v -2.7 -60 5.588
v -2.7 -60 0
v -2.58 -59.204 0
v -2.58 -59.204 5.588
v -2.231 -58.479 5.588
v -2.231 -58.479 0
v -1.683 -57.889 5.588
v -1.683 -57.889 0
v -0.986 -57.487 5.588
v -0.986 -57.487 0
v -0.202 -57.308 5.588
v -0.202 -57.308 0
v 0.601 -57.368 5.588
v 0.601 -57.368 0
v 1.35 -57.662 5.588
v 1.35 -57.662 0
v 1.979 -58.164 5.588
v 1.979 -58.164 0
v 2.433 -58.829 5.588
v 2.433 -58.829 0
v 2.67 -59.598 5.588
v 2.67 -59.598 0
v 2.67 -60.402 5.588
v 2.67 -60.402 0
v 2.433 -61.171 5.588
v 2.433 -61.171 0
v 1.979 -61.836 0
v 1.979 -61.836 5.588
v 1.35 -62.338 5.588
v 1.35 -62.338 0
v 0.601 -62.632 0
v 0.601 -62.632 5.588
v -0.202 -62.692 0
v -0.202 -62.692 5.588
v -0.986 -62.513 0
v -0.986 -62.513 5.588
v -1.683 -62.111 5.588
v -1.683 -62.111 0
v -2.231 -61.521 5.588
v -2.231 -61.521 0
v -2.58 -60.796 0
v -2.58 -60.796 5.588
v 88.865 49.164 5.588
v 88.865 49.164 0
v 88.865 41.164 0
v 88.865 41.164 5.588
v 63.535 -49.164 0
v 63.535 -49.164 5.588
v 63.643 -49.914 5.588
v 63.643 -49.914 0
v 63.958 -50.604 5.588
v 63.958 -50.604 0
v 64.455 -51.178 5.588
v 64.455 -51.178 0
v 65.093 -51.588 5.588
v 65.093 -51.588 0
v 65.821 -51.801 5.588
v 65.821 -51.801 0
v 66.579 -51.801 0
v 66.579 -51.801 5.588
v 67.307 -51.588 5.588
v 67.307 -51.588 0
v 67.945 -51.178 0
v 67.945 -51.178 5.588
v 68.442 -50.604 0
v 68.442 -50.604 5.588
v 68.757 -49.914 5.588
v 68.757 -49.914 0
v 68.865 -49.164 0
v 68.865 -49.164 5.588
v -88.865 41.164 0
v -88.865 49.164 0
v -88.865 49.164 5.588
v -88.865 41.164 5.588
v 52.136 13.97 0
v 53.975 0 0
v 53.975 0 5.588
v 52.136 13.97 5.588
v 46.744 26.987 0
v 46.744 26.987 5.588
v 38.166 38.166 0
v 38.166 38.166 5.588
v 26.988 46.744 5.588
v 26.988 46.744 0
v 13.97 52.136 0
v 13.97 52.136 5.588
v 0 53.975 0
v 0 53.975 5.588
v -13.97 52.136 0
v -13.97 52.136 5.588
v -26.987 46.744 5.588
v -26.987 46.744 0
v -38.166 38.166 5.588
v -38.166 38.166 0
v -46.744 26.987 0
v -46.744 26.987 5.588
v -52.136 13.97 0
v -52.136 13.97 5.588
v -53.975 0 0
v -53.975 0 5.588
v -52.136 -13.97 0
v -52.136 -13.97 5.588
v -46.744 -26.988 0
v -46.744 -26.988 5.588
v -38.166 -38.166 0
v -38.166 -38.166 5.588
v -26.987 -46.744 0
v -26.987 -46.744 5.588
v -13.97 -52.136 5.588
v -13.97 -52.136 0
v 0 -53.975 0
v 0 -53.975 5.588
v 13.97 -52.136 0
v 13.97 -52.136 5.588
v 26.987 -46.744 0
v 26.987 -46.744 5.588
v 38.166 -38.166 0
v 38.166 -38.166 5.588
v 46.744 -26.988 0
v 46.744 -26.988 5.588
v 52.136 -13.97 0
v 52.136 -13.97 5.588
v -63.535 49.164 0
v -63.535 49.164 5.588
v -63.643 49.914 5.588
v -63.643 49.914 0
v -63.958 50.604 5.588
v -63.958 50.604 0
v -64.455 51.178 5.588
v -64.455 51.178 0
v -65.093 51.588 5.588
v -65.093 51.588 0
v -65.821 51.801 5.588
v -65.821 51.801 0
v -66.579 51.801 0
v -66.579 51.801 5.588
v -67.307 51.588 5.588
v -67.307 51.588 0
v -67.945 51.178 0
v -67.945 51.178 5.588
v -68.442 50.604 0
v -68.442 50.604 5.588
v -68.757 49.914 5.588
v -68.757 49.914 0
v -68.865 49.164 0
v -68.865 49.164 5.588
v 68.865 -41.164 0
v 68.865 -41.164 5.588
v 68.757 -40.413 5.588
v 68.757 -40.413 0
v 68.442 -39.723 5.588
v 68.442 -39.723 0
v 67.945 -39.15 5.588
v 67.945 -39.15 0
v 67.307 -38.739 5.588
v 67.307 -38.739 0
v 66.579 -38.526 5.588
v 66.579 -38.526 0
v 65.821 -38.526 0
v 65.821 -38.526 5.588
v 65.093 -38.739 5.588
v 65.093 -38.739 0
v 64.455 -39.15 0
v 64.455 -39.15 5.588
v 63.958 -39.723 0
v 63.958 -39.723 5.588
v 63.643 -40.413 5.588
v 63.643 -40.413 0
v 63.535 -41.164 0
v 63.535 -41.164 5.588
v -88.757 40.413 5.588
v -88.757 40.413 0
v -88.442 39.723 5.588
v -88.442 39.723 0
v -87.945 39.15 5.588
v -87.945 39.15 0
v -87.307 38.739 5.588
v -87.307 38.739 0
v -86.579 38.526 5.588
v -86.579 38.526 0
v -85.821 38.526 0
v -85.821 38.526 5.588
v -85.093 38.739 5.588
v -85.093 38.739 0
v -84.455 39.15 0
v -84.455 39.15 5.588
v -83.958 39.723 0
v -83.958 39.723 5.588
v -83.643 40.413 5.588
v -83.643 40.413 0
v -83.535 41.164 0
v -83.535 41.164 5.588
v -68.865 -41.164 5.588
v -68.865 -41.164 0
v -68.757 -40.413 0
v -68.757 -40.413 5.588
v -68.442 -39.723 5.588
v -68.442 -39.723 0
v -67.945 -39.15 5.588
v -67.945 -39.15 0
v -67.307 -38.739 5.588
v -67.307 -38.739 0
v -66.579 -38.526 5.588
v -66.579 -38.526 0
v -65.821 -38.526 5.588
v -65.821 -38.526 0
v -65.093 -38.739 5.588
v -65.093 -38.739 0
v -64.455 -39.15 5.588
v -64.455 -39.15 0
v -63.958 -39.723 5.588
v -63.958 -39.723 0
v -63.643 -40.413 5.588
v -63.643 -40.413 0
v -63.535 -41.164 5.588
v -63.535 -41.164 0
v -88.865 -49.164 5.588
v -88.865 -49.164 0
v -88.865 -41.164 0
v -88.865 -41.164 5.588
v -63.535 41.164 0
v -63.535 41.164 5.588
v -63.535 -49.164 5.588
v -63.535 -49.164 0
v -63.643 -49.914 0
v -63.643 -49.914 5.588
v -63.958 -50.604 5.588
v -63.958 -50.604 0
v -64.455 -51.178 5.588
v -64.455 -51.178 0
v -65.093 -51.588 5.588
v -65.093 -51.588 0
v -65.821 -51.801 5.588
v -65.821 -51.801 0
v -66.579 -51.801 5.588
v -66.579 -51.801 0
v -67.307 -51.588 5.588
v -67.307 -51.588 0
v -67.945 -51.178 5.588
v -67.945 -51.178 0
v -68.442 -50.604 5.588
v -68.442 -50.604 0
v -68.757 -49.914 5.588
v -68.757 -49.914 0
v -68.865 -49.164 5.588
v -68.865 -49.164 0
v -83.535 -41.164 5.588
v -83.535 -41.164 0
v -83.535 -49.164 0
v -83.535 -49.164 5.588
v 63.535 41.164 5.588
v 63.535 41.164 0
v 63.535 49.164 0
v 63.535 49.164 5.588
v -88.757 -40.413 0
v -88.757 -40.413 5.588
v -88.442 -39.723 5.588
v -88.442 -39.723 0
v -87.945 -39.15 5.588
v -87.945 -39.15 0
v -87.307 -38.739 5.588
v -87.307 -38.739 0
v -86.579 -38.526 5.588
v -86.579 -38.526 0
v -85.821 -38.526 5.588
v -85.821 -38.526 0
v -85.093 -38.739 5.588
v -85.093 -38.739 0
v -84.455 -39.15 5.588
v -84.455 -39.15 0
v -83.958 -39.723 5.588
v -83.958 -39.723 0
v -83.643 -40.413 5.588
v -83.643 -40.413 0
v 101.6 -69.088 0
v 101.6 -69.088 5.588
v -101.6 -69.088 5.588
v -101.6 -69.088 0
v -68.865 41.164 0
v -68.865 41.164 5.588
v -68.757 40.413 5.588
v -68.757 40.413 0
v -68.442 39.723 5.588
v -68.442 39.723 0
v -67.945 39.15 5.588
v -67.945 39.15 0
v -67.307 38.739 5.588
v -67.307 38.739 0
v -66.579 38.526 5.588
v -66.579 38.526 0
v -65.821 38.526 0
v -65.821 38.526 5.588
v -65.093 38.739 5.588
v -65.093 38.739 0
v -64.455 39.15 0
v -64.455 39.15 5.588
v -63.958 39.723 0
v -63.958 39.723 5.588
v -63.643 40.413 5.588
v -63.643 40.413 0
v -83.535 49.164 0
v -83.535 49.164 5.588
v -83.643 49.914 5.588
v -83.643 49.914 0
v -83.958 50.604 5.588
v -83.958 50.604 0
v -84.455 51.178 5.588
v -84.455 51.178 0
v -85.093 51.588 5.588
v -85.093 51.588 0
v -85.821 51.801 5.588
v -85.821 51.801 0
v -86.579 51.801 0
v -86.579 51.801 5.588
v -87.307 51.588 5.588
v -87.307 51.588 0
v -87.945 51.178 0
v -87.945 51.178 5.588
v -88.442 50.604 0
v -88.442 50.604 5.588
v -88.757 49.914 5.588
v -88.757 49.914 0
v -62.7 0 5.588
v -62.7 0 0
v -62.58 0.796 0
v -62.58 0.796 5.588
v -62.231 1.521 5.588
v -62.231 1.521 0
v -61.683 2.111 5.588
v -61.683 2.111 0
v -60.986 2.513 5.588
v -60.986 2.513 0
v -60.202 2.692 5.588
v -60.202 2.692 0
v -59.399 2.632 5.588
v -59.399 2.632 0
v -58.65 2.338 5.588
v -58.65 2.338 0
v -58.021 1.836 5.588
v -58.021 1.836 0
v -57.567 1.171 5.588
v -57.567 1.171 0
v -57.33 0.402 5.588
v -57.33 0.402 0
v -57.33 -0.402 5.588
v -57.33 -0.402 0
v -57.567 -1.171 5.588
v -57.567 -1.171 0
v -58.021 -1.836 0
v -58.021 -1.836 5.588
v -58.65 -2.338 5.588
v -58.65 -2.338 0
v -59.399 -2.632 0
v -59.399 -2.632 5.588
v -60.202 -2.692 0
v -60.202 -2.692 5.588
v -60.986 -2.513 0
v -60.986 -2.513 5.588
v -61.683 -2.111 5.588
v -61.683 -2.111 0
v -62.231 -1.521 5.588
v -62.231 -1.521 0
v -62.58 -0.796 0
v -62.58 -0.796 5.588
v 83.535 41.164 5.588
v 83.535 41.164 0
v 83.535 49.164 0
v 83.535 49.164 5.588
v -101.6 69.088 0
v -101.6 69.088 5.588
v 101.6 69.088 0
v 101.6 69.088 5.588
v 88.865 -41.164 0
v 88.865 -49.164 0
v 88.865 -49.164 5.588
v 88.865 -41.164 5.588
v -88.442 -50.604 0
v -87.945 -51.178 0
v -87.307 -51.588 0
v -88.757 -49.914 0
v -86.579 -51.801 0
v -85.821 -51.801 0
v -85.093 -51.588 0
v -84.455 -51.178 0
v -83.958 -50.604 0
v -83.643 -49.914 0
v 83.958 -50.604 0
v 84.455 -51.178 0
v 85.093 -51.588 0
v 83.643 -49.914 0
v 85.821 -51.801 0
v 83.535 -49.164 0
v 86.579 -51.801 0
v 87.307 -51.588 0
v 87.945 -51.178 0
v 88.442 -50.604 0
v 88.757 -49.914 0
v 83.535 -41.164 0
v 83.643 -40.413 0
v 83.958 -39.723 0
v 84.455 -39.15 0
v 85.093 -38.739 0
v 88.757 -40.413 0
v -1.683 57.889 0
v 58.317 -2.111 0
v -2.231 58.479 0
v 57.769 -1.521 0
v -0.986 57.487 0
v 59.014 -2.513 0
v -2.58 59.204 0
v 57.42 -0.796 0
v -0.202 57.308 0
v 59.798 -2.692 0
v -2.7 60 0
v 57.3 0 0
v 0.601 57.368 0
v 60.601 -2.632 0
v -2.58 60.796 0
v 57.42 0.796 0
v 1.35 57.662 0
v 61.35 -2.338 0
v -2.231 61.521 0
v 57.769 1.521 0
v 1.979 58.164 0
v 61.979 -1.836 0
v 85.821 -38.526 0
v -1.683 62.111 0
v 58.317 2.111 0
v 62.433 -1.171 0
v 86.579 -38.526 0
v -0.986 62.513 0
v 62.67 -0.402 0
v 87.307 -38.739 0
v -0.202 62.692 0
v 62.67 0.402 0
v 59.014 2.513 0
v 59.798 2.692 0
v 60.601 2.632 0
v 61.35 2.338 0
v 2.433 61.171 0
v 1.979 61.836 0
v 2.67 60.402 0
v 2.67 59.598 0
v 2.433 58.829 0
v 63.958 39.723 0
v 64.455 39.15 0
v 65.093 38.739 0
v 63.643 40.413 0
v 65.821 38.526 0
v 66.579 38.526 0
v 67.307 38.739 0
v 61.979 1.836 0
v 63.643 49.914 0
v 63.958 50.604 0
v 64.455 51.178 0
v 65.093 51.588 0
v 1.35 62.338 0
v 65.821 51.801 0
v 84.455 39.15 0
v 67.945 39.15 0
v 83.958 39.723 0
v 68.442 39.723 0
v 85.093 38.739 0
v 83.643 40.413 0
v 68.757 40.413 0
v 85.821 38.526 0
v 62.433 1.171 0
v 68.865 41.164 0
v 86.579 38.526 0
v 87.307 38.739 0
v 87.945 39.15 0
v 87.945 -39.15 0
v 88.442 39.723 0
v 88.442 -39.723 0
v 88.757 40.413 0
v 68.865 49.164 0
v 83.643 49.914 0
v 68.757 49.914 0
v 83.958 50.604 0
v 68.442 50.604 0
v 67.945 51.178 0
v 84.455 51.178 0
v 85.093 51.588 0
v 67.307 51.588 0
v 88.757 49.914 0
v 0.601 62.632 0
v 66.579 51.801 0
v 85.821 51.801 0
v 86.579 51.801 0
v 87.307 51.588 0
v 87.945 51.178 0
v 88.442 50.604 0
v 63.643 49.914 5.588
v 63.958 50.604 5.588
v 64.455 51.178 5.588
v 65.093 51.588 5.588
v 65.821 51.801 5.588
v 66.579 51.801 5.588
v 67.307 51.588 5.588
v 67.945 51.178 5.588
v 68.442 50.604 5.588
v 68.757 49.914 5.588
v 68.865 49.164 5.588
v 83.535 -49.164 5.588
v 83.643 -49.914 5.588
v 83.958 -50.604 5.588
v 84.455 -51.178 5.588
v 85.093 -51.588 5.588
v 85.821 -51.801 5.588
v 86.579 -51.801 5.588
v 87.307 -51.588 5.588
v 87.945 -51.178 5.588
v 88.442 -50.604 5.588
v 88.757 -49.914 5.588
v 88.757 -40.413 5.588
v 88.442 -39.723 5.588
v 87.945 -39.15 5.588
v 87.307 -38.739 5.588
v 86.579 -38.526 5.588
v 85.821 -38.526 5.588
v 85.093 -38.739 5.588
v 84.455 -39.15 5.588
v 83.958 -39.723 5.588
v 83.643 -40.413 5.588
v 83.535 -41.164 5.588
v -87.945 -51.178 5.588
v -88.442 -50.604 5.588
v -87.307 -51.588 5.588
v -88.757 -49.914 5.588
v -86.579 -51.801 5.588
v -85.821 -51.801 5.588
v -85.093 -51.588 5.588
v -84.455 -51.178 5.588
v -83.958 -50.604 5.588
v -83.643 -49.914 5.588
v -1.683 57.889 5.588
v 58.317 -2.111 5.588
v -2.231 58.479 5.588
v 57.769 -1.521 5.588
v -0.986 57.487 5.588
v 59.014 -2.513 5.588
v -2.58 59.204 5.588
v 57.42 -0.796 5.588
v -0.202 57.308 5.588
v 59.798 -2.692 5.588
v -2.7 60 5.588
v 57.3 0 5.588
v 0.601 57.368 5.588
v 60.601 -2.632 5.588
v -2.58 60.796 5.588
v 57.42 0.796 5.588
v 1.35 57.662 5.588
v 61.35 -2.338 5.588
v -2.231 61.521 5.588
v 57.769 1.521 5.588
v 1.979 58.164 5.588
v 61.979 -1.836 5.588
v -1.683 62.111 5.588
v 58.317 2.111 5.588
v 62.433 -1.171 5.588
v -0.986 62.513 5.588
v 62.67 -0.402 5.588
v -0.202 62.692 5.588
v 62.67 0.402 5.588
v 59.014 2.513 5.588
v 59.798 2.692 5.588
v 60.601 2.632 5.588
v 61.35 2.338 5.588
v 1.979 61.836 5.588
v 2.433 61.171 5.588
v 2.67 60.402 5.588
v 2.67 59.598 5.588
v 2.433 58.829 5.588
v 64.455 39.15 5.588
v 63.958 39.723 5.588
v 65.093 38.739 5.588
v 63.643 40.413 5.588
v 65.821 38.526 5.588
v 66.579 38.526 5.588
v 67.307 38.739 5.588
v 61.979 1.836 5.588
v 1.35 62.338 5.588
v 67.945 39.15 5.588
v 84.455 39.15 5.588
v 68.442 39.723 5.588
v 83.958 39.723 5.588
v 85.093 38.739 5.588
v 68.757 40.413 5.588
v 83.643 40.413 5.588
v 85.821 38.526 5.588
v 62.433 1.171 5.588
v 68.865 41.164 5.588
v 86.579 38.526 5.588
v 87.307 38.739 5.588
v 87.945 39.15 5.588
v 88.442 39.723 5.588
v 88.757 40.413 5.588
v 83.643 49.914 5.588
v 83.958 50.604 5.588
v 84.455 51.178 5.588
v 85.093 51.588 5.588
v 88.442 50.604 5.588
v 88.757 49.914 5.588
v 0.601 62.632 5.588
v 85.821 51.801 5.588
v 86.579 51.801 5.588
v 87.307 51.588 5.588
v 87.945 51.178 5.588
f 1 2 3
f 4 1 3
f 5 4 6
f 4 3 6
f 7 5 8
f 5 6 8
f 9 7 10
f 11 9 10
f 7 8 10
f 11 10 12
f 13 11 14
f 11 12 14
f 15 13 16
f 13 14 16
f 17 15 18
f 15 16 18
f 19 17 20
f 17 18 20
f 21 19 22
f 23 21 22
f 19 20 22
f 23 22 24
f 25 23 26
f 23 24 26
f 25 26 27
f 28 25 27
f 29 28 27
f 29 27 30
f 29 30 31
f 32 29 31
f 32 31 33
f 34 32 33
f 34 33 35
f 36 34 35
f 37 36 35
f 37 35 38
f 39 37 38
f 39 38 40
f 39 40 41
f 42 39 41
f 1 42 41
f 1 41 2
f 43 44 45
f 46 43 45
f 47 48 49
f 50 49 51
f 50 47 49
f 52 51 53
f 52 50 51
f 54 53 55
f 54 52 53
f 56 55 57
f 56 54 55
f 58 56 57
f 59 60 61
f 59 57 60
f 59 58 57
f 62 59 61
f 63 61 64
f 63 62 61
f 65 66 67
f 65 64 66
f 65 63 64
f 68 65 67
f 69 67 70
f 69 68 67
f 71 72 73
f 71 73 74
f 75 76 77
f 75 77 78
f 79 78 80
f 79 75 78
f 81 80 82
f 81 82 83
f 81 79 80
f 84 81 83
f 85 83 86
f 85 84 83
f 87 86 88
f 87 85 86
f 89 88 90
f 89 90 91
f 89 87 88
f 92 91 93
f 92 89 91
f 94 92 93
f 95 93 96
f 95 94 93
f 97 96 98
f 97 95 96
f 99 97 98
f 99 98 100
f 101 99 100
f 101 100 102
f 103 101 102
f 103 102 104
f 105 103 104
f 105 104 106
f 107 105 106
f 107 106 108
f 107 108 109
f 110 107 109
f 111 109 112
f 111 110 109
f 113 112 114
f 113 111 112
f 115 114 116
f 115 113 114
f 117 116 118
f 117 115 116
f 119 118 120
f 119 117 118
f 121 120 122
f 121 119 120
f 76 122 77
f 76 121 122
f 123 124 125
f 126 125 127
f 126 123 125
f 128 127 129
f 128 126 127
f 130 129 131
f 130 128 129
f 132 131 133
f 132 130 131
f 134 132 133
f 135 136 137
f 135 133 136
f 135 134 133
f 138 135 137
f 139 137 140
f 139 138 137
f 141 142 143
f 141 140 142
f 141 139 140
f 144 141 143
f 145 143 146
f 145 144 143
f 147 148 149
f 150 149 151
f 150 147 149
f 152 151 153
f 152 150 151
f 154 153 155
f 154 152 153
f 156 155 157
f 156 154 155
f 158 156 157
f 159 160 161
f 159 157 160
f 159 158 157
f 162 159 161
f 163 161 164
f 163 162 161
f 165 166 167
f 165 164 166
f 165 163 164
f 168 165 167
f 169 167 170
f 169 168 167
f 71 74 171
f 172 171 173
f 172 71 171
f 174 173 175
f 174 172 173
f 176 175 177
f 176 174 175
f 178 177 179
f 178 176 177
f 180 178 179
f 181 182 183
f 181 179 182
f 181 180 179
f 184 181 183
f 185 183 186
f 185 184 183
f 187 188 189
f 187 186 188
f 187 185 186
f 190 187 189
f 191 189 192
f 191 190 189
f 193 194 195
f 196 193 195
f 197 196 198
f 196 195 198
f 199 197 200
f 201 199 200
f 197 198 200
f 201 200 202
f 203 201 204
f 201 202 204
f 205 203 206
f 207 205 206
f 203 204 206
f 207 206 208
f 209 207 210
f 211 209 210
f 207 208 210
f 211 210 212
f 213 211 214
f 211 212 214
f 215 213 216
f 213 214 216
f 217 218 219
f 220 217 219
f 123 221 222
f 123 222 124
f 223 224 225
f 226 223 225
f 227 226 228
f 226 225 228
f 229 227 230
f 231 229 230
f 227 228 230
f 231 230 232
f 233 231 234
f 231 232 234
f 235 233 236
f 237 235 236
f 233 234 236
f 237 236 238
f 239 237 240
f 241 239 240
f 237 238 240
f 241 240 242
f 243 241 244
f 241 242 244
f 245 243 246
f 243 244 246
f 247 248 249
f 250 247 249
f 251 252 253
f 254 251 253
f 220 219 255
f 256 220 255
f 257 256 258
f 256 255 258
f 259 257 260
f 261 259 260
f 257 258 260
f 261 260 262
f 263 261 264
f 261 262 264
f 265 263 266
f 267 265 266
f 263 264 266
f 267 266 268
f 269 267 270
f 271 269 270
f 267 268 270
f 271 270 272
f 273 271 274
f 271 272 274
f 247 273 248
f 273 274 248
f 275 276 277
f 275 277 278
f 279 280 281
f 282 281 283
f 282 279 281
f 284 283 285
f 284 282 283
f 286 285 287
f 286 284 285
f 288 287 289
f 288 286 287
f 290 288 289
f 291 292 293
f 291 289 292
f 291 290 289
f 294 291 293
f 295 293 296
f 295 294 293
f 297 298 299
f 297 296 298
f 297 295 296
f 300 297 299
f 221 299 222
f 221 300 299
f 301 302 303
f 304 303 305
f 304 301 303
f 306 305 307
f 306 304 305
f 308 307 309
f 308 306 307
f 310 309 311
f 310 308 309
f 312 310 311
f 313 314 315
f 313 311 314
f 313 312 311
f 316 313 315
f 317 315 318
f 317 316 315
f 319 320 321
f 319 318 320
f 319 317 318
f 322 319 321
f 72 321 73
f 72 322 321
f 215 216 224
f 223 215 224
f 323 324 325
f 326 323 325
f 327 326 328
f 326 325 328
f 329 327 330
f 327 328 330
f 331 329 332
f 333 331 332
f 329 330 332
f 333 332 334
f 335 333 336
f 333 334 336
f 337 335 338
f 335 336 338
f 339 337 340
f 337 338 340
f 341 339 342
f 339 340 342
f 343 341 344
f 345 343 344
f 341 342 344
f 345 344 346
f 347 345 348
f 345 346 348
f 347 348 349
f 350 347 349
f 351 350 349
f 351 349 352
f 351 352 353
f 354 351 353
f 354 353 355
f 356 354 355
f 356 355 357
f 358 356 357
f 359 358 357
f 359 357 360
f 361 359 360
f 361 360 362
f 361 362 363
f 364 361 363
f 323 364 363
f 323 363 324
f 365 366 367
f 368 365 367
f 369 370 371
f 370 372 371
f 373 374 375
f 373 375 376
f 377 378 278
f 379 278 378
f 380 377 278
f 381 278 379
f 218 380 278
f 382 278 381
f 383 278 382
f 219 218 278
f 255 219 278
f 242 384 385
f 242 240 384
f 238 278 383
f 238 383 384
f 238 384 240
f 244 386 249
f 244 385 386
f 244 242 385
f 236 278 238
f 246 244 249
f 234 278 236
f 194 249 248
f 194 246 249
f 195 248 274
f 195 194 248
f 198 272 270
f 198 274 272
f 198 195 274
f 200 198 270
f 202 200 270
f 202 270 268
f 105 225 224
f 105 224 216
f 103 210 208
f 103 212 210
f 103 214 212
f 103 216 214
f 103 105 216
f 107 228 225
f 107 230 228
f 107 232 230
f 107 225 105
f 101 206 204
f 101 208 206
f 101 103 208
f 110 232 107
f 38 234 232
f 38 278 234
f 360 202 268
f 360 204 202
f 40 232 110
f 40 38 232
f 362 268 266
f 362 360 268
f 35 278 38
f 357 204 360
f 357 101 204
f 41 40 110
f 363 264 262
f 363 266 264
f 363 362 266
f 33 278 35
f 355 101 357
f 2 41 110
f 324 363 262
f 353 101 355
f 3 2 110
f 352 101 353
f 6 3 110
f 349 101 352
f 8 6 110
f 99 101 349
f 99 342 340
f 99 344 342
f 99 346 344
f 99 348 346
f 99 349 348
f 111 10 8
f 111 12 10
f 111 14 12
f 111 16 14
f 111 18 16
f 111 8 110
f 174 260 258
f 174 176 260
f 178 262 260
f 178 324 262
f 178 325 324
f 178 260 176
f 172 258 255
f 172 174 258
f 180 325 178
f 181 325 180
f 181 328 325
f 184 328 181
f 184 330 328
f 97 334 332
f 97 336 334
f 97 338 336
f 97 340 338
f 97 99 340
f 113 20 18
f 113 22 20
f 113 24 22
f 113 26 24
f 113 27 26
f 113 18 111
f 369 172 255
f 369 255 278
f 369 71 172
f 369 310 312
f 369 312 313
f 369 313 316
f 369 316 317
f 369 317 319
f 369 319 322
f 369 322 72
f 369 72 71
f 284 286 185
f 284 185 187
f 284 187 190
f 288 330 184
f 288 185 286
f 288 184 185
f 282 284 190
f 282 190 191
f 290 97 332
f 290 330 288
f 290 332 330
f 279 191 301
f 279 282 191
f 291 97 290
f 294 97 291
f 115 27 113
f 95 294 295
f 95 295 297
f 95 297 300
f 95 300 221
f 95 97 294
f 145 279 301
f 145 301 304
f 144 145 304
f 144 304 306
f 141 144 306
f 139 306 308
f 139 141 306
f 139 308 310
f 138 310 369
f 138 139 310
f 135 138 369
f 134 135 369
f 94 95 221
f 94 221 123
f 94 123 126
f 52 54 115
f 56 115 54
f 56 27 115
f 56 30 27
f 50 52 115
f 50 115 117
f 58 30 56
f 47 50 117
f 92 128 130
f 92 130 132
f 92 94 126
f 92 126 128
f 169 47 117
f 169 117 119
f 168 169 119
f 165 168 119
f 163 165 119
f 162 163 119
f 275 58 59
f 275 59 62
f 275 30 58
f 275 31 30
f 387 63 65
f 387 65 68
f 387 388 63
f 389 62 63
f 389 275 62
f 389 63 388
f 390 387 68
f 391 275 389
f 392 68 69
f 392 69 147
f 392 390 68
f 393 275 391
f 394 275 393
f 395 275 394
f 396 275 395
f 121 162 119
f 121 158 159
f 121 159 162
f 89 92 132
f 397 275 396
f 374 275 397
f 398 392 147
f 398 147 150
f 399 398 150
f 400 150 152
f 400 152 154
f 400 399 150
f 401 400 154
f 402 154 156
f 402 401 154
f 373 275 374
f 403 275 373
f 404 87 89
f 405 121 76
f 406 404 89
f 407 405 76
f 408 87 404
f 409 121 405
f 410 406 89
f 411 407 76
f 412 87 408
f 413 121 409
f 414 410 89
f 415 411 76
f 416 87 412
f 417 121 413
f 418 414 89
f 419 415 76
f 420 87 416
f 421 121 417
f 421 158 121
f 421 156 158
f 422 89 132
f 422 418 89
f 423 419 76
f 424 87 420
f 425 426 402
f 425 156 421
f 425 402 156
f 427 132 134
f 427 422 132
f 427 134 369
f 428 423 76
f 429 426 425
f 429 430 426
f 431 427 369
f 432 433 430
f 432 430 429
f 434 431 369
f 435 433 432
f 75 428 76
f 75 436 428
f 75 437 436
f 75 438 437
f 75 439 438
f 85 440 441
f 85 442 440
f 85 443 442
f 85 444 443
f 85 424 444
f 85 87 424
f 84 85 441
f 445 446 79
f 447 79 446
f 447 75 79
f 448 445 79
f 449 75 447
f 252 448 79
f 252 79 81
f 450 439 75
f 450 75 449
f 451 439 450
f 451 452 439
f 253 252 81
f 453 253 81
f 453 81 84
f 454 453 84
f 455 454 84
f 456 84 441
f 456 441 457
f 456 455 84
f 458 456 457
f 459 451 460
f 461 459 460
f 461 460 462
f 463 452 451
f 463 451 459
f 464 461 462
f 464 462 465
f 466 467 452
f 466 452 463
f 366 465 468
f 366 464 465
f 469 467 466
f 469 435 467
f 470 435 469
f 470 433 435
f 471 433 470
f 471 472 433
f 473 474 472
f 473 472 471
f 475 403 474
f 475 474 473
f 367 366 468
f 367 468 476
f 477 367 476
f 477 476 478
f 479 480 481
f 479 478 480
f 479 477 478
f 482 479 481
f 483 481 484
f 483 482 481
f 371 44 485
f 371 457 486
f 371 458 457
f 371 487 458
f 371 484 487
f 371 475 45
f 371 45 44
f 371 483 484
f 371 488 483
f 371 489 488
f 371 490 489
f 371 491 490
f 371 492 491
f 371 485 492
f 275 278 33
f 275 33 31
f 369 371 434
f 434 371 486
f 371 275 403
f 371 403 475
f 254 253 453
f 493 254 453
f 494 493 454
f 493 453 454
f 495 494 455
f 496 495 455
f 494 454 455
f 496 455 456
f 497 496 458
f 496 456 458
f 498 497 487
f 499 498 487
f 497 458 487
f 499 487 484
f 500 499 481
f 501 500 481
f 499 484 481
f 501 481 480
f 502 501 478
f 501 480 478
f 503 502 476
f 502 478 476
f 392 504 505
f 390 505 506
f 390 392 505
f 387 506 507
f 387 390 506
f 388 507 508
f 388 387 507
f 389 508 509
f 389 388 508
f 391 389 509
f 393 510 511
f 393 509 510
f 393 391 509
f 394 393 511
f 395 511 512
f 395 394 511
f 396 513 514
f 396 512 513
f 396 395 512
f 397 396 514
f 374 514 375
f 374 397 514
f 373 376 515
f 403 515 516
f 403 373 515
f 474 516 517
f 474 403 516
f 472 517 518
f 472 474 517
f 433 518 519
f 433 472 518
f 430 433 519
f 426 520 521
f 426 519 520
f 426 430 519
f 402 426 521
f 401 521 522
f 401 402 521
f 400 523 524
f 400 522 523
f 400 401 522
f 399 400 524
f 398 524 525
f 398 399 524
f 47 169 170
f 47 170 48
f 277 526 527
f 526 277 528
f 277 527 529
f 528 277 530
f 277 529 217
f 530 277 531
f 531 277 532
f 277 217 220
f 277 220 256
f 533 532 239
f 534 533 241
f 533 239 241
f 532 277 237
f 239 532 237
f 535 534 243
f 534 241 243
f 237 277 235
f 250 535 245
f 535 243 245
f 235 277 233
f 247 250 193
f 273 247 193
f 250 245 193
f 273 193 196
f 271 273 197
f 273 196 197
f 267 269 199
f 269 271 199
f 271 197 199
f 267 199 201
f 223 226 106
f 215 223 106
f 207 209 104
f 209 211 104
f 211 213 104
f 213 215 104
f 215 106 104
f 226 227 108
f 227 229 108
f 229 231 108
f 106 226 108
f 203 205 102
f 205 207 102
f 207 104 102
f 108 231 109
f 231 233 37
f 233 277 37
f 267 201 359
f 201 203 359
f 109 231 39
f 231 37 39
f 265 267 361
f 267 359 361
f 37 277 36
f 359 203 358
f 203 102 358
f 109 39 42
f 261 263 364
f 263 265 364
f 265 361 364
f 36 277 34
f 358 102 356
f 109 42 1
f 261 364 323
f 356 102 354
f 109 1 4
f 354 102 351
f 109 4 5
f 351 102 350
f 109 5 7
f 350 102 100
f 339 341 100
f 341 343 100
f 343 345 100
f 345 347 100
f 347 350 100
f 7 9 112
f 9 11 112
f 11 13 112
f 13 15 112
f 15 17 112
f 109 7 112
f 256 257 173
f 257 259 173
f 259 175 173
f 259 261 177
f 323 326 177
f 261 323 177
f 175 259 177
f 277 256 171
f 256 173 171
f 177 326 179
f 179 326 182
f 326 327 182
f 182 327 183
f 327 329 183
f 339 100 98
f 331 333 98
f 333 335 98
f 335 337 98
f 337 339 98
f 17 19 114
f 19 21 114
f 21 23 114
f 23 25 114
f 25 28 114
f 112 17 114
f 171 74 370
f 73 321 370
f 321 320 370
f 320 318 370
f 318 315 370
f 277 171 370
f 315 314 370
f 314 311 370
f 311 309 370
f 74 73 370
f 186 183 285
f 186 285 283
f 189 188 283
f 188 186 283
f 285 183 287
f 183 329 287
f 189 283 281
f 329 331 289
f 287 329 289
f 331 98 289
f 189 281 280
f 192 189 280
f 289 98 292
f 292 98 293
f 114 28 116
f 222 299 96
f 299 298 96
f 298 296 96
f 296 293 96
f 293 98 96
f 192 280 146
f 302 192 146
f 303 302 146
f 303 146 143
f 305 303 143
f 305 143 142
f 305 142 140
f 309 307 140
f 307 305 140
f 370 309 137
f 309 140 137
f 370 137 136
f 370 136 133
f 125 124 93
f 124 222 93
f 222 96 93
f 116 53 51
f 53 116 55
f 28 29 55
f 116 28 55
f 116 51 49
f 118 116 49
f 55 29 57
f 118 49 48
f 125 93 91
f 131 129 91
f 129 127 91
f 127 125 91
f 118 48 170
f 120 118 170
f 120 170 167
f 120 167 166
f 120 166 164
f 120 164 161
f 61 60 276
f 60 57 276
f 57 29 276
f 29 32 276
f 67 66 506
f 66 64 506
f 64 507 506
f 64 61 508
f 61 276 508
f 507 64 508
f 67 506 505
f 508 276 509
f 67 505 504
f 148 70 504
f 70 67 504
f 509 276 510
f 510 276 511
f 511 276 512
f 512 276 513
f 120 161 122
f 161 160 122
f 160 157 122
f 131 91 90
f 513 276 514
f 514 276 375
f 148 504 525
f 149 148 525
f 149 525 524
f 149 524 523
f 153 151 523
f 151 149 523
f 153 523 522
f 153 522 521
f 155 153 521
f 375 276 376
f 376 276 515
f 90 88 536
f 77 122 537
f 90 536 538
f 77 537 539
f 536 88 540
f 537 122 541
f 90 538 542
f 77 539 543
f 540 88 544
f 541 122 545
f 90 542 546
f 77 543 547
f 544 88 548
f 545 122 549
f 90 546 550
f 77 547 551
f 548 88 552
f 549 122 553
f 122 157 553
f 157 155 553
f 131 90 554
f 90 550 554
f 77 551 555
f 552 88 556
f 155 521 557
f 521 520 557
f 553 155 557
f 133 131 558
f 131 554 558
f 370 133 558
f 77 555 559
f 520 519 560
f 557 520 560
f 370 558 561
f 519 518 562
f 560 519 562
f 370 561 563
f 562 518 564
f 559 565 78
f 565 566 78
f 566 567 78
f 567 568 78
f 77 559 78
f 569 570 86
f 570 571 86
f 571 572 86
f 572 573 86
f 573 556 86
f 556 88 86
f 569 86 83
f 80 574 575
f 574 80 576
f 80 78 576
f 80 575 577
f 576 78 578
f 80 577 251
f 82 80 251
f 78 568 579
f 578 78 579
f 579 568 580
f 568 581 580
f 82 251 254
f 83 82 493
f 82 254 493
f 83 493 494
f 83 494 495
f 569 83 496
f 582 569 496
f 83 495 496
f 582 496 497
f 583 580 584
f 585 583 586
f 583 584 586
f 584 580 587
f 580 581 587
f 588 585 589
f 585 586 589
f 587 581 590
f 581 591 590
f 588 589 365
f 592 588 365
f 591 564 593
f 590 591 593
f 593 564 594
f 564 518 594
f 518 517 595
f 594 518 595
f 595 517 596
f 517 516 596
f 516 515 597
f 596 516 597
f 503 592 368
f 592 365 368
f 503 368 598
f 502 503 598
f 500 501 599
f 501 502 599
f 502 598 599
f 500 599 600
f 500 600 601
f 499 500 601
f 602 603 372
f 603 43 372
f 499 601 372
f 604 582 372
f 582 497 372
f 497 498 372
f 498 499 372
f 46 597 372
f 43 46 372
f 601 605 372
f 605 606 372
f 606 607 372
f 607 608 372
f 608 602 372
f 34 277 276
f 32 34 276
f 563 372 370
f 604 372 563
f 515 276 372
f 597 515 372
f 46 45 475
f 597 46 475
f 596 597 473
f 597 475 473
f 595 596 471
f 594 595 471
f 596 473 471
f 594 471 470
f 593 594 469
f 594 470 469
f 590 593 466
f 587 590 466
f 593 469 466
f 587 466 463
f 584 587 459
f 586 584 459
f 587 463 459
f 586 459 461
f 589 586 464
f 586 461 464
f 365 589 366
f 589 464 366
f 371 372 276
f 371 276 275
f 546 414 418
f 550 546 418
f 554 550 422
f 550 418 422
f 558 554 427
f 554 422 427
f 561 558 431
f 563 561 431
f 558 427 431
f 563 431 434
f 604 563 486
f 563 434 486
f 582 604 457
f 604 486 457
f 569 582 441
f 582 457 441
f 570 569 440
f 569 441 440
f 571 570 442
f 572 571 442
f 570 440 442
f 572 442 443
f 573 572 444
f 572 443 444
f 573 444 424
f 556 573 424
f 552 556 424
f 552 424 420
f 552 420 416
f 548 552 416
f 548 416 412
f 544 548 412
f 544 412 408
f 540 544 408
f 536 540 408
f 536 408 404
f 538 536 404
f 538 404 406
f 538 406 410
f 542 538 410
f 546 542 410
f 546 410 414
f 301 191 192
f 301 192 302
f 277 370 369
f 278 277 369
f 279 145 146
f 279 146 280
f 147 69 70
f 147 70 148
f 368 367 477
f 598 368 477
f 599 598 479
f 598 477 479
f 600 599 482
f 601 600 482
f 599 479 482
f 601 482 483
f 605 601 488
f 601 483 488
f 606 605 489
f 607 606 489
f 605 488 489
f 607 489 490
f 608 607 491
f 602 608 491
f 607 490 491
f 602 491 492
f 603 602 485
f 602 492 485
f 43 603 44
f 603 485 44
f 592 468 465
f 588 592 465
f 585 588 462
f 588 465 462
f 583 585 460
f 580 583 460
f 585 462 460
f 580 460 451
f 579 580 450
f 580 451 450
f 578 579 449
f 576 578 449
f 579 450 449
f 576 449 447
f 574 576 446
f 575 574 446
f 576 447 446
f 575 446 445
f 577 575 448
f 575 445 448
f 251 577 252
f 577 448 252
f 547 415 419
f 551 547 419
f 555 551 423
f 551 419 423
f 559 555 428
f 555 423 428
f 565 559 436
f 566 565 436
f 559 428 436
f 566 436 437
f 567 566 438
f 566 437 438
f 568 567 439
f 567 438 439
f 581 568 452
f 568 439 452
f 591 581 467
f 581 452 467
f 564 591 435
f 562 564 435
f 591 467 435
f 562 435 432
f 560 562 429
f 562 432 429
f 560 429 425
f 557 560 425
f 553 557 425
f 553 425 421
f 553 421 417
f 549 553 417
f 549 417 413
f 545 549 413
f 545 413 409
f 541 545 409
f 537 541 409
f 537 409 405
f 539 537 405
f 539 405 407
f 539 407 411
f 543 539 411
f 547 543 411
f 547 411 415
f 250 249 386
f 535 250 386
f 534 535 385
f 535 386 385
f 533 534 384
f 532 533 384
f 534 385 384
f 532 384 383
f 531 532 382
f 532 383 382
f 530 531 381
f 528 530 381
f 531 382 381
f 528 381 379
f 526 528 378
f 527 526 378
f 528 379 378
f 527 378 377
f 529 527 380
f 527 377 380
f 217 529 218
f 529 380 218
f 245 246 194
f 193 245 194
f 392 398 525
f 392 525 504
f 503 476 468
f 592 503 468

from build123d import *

# Parameters (mm, degrees)
SKETCH1_W                                = 152.4
SKETCH1_H                                = 138.176
SKETCH1_R                                = 53.975
BOSS_EXTRUDE1_DEPTH                      = 5.588
SKETCH5_R                                = 2.665
CUT_EXTRUDE4_DEPTH                       = 450.319819698
CUT_EXTRUDE5_DEPTH                       = 104.008822379
MIRROR1_AT_THE_SECOND_PLANE_COPY_1_DEPTH = 104.008822379
SKETCH7_W                                = 5.588
SKETCH7_H                                = 138.176
BOSS_EXTRUDE2_DEPTH                      = 25.4
CUT_EXTRUDE6_DEPTH                       = 123.991615519
MIRROR3_COPY_1_DEPTH                     = 123.991615519
SKETCH9_R                                = 2.7
CUT_EXTRUDE7_DEPTH                       = 483.750396617


with BuildPart() as part:
    # Sketch1 → Boss-Extrude1 (new body)
    with BuildSketch(Plane.XY):
        Rectangle(SKETCH1_W, SKETCH1_H)
        Circle(SKETCH1_R, mode=Mode.SUBTRACT)
    extrude(amount=BOSS_EXTRUDE1_DEPTH)

    # Sketch5 → Cut-Extrude4 (cut, through all)
    with BuildSketch(Plane(origin=(-338.200209725, -104.490630048, 5.588), x_dir=(0.9999190535665993, -0.012723455288419956, 0), z_dir=(0, 0, 1))):
        with Locations(Location((403.626134832, 63.40628164, 0), (0, 0, 0.729019959))):
            Circle(SKETCH5_R)
    extrude(amount=-CUT_EXTRUDE4_DEPTH, mode=Mode.SUBTRACT)

    # Sketch6 → Cut-Extrude5 (cut, through all)
    with BuildSketch(Plane(origin=(0, 0, 0), x_dir=(-1, 0, 0), z_dir=(0, 0, -1))):
        with BuildLine():
            Line((-68.865, -49.163584611), (-68.865, -41.163584611))
            ThreePointArc((-68.865, -41.163584611), (-66.2, -38.498584611), (-63.535, -41.163584611))
            Line((-63.535, -41.163584611), (-63.535, -49.163584611))
            ThreePointArc((-63.535, -49.163584611), (-66.2, -51.828584611), (-68.865, -49.163584611))
        make_face()
    cut_extrude5 = extrude(amount=-CUT_EXTRUDE5_DEPTH, mode=Mode.SUBTRACT)

    # Mirror1: Cut-Extrude5 across plane
    add(cut_extrude5.mirror(Plane(origin=(0, 0, 0), x_dir=(0, 0, 1), z_dir=(1, 0, 0))), mode=Mode.SUBTRACT)

    # Mirror1 at the second plane: Cut-Extrude5 across plane
    add(cut_extrude5.mirror(Plane.ZX), mode=Mode.SUBTRACT)

    # Mirror1 at the second plane copy 1 sketc → Mirror1 at the second plane copy 1 (cut, through all)
    with BuildSketch(Plane(origin=(0, 0, 0), x_dir=(1, 0, 0), z_dir=(0, 0, -1))):
        with BuildLine():
            Line((-68.865, -49.163584611), (-68.865, -41.163584611))
            ThreePointArc((-68.865, -41.163584611), (-66.2, -38.498584611), (-63.535, -41.163584611))
            Line((-63.535, -41.163584611), (-63.535, -49.163584611))
            ThreePointArc((-63.535, -49.163584611), (-66.2, -51.828584611), (-68.865, -49.163584611))
        make_face()
    extrude(amount=-MIRROR1_AT_THE_SECOND_PLANE_COPY_1_DEPTH, mode=Mode.SUBTRACT)

    # Sketch7 → Boss-Extrude2 (add)
    with BuildSketch(Plane(origin=(76.2, 0, 0), x_dir=(0, 0, -1), z_dir=(1, 0, 0))):
        with Locations((-2.794, 0)):
            Rectangle(SKETCH7_W, SKETCH7_H)
    boss_extrude2 = extrude(amount=BOSS_EXTRUDE2_DEPTH)

    # Sketch8 → Cut-Extrude6 (cut, through all)
    with BuildSketch(Plane(origin=(0, 0, 0), x_dir=(-1, 0, 0), z_dir=(0, 0, -1))):
        with BuildLine():
            Line((-63.535, 49.163584611), (-63.535, 41.163584611))
            ThreePointArc((-63.535, 41.163584611), (-66.2, 38.498584611), (-68.865, 41.163584611))
            Line((-68.865, 41.163584611), (-68.865, 49.163584611))
            ThreePointArc((-68.865, 49.163584611), (-66.2, 51.828584611), (-63.535, 49.163584611))
        make_face()
        with BuildLine():
            Line((-83.535, 41.163584611), (-83.535, 49.163584611))
            ThreePointArc((-83.535, 49.163584611), (-86.2, 51.828584611), (-88.865, 49.163584611))
            Line((-88.865, 49.163584611), (-88.865, 41.163584611))
            ThreePointArc((-88.865, 41.163584611), (-86.2, 38.498584611), (-83.535, 41.163584611))
        make_face()
    cut_extrude6 = extrude(amount=-CUT_EXTRUDE6_DEPTH, mode=Mode.SUBTRACT)

    # Mirror2: Cut-Extrude6 across plane
    add(cut_extrude6.mirror(Plane.ZX), mode=Mode.SUBTRACT)

    # Mirror3: Boss-Extrude2, Cut-Extrude6 across plane
    add(boss_extrude2.mirror(Plane(origin=(0, 0, 0), x_dir=(0, 0, 1), z_dir=(1, 0, 0))))
    add(cut_extrude6.mirror(Plane(origin=(0, 0, 0), x_dir=(0, 0, 1), z_dir=(1, 0, 0))), mode=Mode.SUBTRACT)

    # Mirror3 copy 1 sketch → Mirror3 copy 1 (cut, through all)
    with BuildSketch(Plane(origin=(0, 0, 0), x_dir=(1, 0, 0), z_dir=(0, 0, -1))):
        with BuildLine():
            Line((-63.535, 49.163584611), (-63.535, 41.163584611))
            ThreePointArc((-63.535, 41.163584611), (-66.2, 38.498584611), (-68.865, 41.163584611))
            Line((-68.865, 41.163584611), (-68.865, 49.163584611))
            ThreePointArc((-68.865, 49.163584611), (-66.2, 51.828584611), (-63.535, 49.163584611))
        make_face()
        with BuildLine():
            Line((-83.535, 41.163584611), (-83.535, 49.163584611))
            ThreePointArc((-83.535, 49.163584611), (-86.2, 51.828584611), (-88.865, 49.163584611))
            Line((-88.865, 49.163584611), (-88.865, 41.163584611))
            ThreePointArc((-88.865, 41.163584611), (-86.2, 38.498584611), (-83.535, 41.163584611))
        make_face()
    extrude(amount=-MIRROR3_COPY_1_DEPTH, mode=Mode.SUBTRACT)

    # Sketch9 → Cut-Extrude7 (cut, through all)
    with BuildSketch(Plane(origin=(-338.200209725, -129.890630048, 0), x_dir=(-0.9999190535665993, 0.012723455288419956, 0), z_dir=(0, 0, -1))):
        with Locations(Location((-276.525032787, 133.419783795, 0), (0, 0, 359.270980041))):
            Circle(SKETCH9_R)
        with Locations(Location((-337.283583318, 74.188047898, 0), (0, 0, 359.270980041))):
            Circle(SKETCH9_R)
        with Locations(Location((-396.515319215, 134.946598429, 0), (0, 0, 359.270980041))):
            Circle(SKETCH9_R)
        with Locations(Location((-335.756768683, 194.178334326, 0), (0, 0, 359.270980041))):
            Circle(SKETCH9_R)
    extrude(amount=-CUT_EXTRUDE7_DEPTH, mode=Mode.SUBTRACT)


solid = part.part
